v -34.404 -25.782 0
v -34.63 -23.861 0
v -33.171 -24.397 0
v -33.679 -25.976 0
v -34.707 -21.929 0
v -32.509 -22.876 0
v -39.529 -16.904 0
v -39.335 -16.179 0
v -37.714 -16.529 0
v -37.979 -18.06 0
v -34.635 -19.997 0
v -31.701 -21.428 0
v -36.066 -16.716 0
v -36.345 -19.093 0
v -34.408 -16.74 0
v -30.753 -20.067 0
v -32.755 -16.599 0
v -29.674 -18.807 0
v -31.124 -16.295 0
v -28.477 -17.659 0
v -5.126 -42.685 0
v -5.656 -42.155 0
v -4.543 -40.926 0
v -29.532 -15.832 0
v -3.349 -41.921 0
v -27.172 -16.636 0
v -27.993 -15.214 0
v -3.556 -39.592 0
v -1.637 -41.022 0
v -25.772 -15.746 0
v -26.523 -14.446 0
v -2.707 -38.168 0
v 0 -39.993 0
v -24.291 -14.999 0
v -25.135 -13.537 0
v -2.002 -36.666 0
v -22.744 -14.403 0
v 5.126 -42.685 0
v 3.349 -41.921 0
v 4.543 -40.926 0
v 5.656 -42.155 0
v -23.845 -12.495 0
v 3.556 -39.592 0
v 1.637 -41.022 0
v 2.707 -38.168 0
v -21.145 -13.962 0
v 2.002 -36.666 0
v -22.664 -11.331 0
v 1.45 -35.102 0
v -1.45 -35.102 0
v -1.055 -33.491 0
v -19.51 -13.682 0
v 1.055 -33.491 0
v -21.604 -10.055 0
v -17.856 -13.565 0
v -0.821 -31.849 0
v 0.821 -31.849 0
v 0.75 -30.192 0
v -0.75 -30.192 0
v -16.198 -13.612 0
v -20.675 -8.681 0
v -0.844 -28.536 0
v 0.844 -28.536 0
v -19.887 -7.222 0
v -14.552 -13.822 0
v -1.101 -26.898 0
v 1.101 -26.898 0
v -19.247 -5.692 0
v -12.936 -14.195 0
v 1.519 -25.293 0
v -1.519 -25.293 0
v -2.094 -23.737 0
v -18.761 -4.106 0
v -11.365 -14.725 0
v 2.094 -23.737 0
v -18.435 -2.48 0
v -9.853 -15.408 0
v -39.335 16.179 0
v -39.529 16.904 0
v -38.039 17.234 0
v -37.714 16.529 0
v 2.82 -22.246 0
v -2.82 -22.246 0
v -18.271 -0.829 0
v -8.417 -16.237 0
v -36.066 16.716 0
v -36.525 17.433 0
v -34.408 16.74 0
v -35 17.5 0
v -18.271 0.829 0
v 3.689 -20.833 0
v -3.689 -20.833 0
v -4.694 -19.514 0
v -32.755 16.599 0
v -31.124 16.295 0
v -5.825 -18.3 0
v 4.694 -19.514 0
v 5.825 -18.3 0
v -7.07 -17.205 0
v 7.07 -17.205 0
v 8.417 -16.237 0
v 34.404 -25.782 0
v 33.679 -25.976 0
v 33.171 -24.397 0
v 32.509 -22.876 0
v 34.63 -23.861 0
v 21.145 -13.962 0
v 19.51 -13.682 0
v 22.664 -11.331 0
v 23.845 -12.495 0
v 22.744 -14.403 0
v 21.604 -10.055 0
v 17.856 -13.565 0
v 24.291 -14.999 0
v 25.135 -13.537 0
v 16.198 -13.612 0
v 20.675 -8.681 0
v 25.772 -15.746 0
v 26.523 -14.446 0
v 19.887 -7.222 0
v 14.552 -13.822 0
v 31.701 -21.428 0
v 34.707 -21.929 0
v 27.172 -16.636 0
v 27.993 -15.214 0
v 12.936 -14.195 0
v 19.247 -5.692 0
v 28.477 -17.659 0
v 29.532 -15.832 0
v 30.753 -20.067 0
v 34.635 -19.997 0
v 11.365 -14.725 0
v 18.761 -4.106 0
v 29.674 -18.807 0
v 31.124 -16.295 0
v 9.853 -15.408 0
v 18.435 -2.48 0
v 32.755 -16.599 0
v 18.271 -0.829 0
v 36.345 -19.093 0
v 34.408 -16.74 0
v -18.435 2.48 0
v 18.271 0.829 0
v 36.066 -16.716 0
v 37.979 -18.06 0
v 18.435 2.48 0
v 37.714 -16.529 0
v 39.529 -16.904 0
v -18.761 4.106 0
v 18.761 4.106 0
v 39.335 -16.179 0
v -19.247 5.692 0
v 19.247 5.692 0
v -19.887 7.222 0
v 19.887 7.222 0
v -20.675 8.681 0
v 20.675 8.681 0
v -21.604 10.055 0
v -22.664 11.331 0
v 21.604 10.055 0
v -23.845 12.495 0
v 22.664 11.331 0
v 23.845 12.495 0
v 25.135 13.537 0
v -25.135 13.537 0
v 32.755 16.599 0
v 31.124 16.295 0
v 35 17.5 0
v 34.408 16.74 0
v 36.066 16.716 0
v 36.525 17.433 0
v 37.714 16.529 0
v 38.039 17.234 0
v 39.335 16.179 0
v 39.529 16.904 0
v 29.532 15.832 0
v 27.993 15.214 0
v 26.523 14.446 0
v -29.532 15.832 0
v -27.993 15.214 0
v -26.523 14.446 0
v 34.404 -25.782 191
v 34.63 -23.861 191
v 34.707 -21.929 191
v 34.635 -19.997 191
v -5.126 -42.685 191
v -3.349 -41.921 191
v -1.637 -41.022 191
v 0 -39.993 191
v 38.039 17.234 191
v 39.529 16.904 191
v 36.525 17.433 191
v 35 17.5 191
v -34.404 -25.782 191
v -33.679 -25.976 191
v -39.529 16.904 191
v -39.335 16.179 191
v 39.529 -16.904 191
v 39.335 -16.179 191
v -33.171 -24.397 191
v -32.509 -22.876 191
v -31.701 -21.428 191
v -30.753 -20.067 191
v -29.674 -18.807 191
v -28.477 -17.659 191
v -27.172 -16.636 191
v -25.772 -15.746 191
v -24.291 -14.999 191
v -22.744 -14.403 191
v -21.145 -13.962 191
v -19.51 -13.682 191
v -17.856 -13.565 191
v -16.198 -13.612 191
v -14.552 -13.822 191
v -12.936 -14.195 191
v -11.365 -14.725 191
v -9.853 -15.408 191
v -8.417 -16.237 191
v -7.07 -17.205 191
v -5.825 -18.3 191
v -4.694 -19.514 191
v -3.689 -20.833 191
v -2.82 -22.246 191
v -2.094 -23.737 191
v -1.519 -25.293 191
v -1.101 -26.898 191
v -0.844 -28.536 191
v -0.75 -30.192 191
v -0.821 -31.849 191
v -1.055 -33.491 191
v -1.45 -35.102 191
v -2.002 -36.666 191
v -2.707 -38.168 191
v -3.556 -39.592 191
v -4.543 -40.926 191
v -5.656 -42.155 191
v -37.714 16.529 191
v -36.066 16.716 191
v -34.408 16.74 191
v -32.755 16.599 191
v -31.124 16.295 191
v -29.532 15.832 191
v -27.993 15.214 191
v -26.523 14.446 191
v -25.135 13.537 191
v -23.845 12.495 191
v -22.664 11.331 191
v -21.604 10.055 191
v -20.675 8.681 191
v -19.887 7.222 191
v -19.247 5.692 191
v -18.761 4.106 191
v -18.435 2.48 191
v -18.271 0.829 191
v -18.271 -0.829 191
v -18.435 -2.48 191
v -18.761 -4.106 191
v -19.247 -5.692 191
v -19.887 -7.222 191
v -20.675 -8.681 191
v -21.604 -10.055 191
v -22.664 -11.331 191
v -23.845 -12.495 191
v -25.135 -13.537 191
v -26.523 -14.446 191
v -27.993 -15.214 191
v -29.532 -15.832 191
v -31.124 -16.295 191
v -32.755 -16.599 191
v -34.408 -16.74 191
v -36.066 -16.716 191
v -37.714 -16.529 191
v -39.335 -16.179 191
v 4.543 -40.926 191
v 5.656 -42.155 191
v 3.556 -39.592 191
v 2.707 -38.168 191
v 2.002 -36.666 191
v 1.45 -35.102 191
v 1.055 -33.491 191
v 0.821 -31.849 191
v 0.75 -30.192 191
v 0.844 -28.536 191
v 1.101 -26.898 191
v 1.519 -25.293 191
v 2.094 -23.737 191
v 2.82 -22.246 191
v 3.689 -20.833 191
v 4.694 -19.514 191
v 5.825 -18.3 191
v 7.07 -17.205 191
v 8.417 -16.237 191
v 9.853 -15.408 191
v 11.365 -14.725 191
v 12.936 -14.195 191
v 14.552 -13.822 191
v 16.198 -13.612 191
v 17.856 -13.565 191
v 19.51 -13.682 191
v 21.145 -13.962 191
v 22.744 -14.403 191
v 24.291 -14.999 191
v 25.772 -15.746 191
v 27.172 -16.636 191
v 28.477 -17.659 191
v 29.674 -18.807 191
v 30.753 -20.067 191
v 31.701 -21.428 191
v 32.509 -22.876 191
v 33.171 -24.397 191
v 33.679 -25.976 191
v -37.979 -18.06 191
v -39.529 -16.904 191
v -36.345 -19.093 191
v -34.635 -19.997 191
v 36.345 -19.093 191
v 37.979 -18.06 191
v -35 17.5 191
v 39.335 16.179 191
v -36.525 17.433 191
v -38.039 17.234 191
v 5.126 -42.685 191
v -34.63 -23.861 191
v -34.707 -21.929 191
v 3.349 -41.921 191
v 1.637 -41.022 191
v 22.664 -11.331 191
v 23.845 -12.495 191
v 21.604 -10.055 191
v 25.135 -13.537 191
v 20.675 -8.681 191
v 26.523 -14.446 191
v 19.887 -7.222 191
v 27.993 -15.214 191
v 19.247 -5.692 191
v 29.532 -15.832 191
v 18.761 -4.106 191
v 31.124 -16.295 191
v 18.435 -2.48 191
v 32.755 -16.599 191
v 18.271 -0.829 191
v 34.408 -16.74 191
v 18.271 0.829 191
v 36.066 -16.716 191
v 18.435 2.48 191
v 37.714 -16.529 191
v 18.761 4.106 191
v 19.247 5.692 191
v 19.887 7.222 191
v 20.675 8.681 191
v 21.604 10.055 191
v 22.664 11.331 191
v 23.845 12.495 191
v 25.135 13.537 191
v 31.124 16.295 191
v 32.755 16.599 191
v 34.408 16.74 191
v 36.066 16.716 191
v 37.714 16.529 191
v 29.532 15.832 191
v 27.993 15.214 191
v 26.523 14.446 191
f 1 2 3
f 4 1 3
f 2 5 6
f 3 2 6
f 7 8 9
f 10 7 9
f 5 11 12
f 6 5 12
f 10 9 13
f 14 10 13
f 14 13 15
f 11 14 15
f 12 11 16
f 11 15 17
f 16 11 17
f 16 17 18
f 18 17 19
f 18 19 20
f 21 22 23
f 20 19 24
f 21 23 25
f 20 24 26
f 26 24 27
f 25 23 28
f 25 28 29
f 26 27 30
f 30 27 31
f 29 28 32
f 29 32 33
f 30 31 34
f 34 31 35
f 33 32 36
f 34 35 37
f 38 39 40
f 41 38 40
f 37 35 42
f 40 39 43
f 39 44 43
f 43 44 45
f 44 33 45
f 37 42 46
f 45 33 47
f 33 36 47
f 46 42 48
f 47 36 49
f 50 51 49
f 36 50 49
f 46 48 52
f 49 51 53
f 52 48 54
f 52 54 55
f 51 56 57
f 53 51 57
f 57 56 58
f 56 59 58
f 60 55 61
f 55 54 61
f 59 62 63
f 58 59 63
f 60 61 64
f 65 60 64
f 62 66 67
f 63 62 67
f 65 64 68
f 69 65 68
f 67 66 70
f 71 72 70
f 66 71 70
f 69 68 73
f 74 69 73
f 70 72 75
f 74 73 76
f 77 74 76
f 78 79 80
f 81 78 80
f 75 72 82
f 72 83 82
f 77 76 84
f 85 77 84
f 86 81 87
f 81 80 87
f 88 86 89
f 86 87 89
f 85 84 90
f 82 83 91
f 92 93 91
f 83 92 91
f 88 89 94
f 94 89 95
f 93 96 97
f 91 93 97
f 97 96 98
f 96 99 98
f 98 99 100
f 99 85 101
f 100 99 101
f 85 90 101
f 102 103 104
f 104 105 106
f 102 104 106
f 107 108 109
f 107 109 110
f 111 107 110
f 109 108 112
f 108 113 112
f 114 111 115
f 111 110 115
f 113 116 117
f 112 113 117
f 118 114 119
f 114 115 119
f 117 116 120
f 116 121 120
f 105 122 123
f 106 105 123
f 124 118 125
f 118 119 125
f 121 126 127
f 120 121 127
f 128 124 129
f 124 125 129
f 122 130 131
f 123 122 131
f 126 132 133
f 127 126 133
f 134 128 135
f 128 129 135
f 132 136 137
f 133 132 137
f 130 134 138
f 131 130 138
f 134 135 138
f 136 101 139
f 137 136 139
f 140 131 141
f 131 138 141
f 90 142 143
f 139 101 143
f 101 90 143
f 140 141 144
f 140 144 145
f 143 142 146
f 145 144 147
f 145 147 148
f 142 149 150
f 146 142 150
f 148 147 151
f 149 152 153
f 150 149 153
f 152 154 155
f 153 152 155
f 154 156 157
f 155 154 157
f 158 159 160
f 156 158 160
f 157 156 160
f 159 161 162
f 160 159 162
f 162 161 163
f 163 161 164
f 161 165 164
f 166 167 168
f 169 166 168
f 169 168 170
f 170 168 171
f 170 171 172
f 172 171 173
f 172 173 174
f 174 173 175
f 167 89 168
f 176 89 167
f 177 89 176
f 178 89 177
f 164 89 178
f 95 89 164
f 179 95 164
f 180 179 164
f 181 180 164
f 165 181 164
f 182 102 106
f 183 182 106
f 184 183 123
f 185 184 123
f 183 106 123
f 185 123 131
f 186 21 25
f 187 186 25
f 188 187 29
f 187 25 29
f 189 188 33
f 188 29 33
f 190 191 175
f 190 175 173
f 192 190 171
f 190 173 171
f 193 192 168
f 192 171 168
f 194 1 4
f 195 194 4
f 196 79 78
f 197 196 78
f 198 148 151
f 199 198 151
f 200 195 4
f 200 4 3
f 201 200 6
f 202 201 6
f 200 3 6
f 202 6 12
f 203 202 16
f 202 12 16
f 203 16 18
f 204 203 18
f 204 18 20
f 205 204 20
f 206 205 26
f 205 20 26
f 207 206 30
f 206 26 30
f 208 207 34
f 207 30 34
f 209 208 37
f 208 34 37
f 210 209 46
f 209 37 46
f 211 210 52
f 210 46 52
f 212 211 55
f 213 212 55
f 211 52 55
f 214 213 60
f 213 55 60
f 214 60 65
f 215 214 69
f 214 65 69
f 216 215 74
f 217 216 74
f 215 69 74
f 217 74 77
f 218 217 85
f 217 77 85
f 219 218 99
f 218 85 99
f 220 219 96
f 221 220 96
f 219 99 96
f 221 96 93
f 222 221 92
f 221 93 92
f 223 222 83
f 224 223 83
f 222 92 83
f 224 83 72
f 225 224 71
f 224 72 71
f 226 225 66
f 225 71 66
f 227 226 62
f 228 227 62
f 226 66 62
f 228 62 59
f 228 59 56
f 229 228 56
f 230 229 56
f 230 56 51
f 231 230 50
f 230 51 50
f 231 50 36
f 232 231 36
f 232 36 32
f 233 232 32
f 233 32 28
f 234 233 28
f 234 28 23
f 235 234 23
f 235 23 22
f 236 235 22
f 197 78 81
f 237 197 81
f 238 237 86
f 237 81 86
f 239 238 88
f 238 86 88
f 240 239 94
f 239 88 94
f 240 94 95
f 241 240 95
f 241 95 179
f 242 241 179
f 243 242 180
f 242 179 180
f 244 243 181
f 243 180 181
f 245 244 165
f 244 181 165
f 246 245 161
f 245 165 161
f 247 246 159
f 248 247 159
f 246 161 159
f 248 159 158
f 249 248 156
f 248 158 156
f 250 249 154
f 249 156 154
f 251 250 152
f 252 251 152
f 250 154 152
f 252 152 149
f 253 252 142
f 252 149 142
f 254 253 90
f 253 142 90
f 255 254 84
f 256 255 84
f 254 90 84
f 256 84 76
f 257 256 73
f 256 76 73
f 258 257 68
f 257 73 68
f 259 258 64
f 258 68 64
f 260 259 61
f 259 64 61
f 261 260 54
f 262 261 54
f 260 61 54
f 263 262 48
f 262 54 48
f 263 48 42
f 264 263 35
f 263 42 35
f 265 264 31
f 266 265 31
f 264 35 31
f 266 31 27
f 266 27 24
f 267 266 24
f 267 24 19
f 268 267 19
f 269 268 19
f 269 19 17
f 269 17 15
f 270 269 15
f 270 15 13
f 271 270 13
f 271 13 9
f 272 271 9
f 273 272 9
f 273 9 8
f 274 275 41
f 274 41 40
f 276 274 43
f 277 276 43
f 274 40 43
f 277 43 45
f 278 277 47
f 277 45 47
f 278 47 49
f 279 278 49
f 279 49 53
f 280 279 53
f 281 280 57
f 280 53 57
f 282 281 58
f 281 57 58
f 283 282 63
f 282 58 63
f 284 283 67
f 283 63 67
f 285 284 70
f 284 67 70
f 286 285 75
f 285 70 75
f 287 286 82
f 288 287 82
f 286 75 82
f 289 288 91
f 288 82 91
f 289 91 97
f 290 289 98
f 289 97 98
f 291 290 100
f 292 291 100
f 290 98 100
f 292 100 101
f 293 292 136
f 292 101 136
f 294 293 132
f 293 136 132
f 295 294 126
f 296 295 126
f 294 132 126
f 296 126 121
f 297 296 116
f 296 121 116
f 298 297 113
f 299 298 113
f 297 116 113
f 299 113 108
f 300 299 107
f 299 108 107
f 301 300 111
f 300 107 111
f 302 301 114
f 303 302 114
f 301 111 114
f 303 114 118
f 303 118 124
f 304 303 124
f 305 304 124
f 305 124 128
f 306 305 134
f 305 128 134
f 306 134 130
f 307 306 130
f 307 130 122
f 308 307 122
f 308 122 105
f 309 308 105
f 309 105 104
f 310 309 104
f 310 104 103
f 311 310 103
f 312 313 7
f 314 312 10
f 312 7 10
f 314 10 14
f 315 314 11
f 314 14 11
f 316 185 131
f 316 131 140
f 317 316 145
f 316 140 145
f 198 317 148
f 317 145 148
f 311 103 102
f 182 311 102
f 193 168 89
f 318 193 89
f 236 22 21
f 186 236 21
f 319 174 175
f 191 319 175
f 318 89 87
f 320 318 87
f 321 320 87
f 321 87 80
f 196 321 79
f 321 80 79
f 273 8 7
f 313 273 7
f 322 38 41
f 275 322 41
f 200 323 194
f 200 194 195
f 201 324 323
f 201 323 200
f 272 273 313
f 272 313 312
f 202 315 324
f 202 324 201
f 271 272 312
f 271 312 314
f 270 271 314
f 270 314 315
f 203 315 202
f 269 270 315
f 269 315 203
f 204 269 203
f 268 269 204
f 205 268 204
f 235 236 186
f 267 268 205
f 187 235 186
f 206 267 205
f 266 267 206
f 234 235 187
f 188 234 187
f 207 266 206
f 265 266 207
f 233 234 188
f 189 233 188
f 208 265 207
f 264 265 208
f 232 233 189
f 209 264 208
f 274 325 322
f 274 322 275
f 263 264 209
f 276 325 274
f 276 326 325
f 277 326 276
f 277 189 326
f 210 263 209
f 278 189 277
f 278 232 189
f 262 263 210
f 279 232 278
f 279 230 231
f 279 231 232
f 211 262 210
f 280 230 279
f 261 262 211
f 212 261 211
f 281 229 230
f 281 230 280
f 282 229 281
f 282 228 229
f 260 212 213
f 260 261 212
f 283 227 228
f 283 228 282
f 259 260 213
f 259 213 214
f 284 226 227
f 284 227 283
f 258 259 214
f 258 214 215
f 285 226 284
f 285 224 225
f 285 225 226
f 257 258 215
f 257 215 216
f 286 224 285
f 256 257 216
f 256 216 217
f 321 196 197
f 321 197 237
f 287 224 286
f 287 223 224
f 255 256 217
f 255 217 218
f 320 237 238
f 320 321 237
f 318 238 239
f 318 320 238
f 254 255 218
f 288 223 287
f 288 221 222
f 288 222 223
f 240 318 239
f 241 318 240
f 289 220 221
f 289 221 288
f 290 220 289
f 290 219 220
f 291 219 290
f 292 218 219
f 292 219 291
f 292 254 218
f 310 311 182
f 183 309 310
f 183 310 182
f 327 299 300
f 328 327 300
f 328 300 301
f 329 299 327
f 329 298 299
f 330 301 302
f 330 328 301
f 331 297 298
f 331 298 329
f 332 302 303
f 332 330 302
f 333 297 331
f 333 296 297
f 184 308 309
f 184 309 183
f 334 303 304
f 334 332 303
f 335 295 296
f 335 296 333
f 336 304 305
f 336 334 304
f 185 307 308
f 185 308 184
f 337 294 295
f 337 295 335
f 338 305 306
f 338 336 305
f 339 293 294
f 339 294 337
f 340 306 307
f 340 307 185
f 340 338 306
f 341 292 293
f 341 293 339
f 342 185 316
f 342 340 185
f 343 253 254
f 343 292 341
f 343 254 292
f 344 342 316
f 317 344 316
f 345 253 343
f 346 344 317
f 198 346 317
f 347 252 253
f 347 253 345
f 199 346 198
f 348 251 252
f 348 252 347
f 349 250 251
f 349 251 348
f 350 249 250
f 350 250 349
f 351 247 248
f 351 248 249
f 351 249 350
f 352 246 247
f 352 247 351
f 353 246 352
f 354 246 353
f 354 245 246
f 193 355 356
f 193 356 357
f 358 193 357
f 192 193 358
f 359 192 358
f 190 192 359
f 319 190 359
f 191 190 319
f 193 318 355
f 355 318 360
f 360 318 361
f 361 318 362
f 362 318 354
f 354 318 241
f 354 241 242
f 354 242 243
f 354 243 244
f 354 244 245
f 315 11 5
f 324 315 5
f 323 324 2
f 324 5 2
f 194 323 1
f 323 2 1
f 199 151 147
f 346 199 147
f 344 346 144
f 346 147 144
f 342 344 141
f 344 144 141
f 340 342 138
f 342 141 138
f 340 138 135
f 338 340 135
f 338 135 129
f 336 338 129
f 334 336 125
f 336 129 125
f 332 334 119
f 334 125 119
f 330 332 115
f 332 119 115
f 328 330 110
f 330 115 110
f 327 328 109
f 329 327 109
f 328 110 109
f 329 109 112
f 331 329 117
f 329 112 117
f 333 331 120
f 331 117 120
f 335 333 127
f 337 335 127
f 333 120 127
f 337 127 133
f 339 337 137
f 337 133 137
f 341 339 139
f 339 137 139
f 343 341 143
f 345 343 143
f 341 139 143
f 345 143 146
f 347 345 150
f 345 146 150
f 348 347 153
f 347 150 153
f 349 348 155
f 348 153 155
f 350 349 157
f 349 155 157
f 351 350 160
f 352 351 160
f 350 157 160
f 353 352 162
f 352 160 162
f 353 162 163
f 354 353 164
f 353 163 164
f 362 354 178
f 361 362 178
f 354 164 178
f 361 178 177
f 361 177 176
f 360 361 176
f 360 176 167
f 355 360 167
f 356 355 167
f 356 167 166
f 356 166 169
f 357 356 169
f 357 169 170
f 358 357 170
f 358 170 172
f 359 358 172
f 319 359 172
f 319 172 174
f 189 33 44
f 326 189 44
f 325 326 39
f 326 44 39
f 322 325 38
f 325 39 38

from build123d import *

# Parameters (mm, degrees)
BOSS_EXTRU_1_DEPTH = 191


with BuildPart() as part:
    # Esquisse1 → Boss.-Extru.1 (new body)
    with BuildSketch(Plane.XY):
        with BuildLine():
            Line((-39.529333289, 16.90370196), (-39.335219005, 16.17925759))
            ThreePointArc((-39.335219005, 16.17925759), (-18.25, 0), (-39.335219005, -16.17925759))
            Line((-39.335219005, -16.17925759), (-39.529333289, -16.90370196))
            ThreePointArc((-39.529333289, -16.90370196), (-37.17213026, -18.592337614), (-34.635254916, -19.996673749))
            ThreePointArc((-34.635254916, -19.996673749), (-34.68750182, -22.895840311), (-34.40370196, -25.781555843))
            Line((-34.40370196, -25.781555843), (-33.67925759, -25.975670127))
            ThreePointArc((-33.67925759, -25.975670127), (-9.125, -15.804963619), (-5.655961415, -42.154927717))
            Line((-5.655961415, -42.154927717), (-5.125631329, -42.685257803))
            ThreePointArc((-5.125631329, -42.685257803), (-2.48462844, -41.488177925), (0, -39.993347498))
            ThreePointArc((0, -39.993347498), (2.48462844, -41.488177925), (5.125631329, -42.685257803))
            Line((5.125631329, -42.685257803), (5.655961415, -42.154927717))
            ThreePointArc((5.655961415, -42.154927717), (9.125, -15.804963619), (33.67925759, -25.975670127))
            Line((33.67925759, -25.975670127), (34.40370196, -25.781555843))
            ThreePointArc((34.40370196, -25.781555843), (34.68750182, -22.895840311), (34.635254916, -19.996673749))
            ThreePointArc((34.635254916, -19.996673749), (37.17213026, -18.592337614), (39.529333289, -16.90370196))
            Line((39.529333289, -16.90370196), (39.335219005, -16.17925759))
            ThreePointArc((39.335219005, -16.17925759), (18.25, 0), (39.335219005, 16.17925759))
            Line((39.335219005, 16.17925759), (39.529333289, 16.90370196))
            ThreePointArc((39.529333289, 16.90370196), (37.284208364, 17.350285074), (35, 17.5))
            Line((35, 17.5), (-35, 17.5))
            ThreePointArc((-35, 17.5), (-37.284208364, 17.350285074), (-39.529333289, 16.90370196))
        make_face()
    extrude(amount=BOSS_EXTRU_1_DEPTH)


solid = part.part
